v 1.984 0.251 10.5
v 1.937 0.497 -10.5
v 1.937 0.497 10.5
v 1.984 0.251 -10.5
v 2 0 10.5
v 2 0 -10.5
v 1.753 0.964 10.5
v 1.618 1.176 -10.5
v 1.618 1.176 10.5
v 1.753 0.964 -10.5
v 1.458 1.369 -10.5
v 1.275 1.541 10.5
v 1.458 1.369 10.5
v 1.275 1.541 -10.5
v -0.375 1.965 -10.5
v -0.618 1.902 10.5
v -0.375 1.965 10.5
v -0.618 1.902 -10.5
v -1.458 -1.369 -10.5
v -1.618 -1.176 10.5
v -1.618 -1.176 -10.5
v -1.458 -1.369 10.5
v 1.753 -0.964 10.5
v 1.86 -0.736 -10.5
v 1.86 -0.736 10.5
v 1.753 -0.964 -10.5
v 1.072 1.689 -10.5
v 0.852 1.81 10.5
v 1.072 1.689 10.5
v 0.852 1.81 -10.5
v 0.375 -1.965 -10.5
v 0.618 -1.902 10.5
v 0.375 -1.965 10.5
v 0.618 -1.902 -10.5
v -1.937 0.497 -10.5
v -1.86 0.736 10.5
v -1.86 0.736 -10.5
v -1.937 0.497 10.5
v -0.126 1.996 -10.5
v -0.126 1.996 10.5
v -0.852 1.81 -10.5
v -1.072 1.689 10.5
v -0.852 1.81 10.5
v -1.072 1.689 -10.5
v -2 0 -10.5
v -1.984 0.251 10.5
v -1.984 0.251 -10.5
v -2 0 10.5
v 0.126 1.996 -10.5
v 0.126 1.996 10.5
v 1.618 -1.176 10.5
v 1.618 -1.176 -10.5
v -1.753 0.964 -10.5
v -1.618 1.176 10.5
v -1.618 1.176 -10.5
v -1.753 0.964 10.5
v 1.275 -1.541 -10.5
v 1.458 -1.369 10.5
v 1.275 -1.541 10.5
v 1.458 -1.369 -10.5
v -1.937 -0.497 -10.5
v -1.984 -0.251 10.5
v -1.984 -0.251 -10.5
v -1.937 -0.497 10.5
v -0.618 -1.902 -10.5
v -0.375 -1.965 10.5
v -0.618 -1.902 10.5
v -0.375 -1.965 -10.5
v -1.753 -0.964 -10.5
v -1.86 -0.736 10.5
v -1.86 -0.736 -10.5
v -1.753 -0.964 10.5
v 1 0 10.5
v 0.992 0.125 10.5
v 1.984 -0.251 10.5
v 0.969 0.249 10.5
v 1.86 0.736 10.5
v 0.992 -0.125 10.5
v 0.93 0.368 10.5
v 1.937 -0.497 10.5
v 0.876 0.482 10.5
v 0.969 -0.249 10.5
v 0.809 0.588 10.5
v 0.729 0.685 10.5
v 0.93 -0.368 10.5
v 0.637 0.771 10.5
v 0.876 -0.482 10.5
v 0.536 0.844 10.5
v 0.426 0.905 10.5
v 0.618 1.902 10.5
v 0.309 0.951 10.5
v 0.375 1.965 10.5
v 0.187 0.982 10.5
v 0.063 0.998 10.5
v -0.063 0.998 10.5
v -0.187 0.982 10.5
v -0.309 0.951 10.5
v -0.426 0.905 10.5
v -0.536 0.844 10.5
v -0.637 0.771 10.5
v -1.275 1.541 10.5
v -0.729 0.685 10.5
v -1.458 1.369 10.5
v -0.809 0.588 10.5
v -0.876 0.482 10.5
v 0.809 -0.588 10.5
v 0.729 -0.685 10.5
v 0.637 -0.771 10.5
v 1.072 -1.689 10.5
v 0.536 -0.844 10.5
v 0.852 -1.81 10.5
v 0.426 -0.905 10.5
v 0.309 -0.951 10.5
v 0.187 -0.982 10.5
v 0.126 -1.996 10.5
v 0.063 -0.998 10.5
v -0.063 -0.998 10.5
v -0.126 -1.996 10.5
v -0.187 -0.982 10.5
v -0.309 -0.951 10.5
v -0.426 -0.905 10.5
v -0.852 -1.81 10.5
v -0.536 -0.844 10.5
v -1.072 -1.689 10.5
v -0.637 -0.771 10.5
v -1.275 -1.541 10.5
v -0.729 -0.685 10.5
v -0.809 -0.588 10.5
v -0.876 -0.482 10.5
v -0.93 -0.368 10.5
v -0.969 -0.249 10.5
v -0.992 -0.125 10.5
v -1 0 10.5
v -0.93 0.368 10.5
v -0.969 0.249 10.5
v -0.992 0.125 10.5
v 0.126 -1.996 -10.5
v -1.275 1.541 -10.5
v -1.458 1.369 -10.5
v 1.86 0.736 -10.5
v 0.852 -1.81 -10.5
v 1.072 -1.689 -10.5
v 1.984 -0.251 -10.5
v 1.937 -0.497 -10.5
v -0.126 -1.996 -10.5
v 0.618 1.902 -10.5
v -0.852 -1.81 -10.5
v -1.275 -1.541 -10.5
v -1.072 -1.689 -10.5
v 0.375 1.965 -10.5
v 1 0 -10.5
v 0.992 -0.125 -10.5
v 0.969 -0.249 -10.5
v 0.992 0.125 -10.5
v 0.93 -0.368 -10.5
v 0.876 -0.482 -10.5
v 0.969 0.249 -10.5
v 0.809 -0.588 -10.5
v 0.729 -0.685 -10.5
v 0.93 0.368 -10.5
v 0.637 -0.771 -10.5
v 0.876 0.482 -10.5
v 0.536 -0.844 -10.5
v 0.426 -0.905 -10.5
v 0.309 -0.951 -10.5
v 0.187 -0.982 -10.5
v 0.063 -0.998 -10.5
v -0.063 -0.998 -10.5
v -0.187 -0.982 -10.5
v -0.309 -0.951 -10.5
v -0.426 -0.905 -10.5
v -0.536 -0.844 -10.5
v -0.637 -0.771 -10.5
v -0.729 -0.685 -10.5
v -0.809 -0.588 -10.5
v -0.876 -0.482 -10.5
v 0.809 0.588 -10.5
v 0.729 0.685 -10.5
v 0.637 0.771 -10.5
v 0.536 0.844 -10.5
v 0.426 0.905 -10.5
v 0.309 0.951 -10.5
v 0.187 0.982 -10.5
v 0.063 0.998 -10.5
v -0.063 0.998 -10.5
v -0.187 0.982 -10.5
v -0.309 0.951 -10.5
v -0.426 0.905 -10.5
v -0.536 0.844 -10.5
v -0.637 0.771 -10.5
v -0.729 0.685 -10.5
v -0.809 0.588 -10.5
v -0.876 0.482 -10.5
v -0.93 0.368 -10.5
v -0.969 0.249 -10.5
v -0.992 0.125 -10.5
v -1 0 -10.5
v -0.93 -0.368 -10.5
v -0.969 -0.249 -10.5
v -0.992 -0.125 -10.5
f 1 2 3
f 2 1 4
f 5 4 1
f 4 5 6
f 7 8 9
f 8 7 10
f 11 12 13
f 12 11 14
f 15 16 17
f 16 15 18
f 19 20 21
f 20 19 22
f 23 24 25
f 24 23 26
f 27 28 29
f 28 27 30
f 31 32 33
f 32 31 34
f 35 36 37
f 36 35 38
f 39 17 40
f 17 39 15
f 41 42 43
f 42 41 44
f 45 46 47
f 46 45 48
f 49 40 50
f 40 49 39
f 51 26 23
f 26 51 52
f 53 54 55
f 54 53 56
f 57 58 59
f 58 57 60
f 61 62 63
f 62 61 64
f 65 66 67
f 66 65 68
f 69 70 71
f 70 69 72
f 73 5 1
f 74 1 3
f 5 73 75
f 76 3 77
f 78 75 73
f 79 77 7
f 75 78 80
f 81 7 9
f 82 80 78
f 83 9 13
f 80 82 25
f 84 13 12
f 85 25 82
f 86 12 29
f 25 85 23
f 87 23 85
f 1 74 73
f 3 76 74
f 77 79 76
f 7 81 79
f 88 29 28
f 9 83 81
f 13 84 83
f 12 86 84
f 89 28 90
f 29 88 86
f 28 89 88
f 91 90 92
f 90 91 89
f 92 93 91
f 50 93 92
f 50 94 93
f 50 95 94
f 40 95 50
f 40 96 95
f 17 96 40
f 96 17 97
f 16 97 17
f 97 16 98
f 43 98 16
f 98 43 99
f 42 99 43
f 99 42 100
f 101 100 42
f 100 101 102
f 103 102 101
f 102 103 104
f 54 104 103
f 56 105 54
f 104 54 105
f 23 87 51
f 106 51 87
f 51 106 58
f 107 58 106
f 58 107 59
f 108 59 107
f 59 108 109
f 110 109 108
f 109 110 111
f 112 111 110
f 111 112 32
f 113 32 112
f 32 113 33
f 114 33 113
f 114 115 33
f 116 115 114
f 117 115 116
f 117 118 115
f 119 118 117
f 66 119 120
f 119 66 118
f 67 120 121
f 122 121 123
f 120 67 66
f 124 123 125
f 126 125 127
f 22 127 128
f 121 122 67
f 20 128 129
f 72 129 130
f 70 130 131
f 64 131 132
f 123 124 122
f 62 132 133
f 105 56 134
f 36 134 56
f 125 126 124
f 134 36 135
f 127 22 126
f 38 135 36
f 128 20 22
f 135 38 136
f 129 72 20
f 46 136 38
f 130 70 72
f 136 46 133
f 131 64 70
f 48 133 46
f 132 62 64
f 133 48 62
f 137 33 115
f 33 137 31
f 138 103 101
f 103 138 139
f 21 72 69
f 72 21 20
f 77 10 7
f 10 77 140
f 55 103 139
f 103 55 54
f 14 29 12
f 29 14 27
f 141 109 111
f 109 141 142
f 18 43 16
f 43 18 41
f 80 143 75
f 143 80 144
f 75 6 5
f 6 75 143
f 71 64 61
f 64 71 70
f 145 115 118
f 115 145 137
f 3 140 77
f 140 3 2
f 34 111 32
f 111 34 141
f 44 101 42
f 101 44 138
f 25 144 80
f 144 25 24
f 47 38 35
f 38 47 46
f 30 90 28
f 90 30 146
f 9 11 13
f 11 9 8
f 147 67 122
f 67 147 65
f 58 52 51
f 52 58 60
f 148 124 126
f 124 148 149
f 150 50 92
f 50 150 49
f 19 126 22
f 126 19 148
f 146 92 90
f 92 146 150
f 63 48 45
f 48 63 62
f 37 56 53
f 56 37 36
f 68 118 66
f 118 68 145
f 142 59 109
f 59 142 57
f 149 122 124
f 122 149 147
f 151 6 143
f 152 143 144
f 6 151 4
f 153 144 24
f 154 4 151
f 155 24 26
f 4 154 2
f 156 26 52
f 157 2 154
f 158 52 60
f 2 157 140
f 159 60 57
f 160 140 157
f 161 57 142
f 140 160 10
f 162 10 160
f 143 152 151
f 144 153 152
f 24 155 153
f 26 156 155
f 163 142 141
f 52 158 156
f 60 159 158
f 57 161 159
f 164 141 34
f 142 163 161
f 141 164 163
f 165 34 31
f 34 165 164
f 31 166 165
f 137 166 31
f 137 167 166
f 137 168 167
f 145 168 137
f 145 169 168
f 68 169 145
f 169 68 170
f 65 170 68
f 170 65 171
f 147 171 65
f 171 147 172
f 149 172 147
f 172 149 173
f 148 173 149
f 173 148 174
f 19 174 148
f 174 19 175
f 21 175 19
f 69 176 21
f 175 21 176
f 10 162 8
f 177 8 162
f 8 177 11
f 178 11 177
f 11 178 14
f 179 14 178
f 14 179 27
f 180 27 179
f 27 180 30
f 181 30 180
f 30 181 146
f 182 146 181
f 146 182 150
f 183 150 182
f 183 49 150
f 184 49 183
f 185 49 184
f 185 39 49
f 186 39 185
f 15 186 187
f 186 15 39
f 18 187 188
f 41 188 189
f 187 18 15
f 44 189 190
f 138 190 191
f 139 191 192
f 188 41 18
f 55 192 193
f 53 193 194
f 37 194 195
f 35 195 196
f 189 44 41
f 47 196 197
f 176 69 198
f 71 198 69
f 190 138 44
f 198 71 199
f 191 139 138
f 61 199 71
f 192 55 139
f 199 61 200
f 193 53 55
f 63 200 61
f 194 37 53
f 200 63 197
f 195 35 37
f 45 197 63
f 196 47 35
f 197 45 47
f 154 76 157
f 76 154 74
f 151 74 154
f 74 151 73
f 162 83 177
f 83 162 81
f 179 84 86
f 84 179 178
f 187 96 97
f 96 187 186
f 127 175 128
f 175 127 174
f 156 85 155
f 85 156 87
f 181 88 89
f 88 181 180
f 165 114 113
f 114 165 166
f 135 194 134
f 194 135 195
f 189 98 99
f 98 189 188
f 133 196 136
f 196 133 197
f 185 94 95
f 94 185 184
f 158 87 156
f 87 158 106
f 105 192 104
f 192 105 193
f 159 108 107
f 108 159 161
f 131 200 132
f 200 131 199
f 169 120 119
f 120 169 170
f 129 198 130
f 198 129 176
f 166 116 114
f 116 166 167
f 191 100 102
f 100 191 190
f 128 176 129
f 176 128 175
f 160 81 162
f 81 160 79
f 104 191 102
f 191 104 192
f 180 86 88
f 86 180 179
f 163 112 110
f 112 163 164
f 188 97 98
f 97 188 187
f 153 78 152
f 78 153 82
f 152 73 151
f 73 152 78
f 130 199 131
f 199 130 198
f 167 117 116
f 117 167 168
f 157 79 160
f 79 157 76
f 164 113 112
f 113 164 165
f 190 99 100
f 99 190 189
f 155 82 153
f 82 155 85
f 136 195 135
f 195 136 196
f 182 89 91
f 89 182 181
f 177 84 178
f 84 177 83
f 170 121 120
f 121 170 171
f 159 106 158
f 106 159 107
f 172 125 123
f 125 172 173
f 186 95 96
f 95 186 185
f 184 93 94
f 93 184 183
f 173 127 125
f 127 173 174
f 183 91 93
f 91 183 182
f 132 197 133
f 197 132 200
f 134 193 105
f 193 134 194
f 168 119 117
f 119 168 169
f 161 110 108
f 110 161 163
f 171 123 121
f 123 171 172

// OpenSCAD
$fn = 50;


difference() {
	union() {
		translate(v = [0, 0, -10.5000000000]) {
			cylinder(h = 21, r = 2.0000000000);
		}
	}
	union() {
		translate(v = [0, 0, -100.0000000000]) {
			cylinder(h = 200, r = 1.0000000000);
		}
	}
}
